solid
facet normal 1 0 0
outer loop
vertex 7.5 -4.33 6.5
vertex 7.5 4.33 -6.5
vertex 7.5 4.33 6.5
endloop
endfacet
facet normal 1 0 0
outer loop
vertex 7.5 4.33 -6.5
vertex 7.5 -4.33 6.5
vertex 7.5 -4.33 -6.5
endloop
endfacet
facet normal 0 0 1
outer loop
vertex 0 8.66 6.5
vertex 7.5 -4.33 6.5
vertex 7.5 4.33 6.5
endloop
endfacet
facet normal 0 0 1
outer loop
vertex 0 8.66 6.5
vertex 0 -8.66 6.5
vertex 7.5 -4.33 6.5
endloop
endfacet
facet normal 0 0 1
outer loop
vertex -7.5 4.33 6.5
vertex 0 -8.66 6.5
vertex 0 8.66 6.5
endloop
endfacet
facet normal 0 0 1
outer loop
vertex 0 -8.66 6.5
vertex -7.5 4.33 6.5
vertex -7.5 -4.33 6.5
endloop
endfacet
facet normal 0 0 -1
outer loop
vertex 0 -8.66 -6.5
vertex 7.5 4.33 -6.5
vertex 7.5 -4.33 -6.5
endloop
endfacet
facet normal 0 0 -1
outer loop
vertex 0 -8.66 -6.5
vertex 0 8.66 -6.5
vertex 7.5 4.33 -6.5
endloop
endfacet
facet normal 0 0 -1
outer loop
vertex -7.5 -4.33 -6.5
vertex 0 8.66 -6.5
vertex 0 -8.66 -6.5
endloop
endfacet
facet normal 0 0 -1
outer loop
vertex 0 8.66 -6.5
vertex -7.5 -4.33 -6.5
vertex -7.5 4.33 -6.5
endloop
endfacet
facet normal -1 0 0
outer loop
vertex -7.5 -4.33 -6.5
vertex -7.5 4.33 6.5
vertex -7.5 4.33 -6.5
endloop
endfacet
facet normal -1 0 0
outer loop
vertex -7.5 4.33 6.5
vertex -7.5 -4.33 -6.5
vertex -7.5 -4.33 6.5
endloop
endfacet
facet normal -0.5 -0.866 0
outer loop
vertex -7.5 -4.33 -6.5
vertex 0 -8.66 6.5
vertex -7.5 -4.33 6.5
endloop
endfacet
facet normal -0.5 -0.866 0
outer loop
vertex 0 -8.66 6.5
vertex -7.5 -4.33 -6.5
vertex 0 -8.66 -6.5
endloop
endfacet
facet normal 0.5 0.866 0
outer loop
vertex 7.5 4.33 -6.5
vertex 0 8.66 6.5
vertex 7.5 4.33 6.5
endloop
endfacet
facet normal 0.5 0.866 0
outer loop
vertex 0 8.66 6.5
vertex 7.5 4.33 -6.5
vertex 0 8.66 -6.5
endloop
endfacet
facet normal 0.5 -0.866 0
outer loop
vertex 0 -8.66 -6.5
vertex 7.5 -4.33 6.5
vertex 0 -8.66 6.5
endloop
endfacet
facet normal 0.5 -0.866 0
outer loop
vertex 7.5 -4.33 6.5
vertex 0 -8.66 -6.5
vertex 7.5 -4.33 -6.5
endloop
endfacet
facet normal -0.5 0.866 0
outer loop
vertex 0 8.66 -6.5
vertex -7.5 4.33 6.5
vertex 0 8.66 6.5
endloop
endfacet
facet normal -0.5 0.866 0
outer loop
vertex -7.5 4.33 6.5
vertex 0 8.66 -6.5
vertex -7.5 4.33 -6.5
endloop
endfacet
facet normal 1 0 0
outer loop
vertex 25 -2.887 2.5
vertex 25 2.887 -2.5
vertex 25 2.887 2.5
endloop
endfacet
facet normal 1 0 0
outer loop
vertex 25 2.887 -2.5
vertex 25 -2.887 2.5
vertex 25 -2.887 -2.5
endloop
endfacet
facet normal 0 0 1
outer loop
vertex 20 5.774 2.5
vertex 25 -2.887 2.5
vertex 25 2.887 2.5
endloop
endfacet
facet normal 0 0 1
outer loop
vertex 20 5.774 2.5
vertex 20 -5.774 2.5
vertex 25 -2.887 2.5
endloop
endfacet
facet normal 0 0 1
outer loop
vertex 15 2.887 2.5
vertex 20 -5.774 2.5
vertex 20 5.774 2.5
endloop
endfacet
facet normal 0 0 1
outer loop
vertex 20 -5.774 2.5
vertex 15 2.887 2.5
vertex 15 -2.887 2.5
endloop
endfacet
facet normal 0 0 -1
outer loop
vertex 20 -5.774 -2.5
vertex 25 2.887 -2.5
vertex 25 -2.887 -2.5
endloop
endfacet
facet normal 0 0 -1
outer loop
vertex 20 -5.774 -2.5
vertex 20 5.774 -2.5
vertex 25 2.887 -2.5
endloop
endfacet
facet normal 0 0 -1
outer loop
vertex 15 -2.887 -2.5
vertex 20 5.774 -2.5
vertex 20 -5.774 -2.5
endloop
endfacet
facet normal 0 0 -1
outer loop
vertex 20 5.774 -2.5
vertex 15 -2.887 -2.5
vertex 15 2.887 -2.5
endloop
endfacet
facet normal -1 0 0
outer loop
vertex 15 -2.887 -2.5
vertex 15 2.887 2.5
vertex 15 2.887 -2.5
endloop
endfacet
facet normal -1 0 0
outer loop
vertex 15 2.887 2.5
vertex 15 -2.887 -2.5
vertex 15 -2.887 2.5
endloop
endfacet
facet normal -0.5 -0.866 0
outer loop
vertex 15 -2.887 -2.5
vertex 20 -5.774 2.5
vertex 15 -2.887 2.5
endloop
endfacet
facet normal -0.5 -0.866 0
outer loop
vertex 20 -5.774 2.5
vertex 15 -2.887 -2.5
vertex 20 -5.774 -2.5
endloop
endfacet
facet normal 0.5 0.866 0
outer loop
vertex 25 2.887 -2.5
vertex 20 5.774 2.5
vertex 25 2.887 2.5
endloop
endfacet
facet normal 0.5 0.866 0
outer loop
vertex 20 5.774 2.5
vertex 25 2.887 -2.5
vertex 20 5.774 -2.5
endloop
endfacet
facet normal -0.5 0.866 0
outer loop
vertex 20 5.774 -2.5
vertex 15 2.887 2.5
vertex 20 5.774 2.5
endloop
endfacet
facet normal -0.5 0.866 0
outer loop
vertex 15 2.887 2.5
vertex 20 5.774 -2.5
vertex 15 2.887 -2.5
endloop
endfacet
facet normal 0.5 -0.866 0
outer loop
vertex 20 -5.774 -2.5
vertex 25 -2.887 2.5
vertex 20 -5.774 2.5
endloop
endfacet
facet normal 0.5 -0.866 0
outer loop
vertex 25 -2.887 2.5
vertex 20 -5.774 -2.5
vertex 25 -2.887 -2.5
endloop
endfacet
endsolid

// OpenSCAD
/**
 *	source code originially from this thing: 
 * 
 * 		http://www.thingiverse.com/thing:277727
 */

//============================================================
// OpenSCAD
// Licence : LICENCE PUBLIQUE RIEN À BRANLER
// Licence : do What The Fuck you want to Public License
//============================================================
/*

	Usage:
	use <Hexagones.scad>;
	Pour créer des jeux, des têtes de vis...

*/


//------------------------------------------------------------
// Demo
//------------------------------------------------------------
$fn = 150 ;			// OpenSCAD Resolution

// hexagone de 1 pouce (1 inch) soit 25.4 mm
Hexagone(cle=15,h=13);

color("green")
translate([20,0,0])
hexagon(cle=10, h=5);

/**
 * this is the English version of the module :)
 */
module hexagon(cle, h)
{
	Hexagone(cle,h);
}

//------------------------------------------------------------
// Hexagone
// cle	écart, ex: clé de 12 alors cle=12
// h		hauteur
//------------------------------------------------------------
module Hexagone(cle,h)
{
	angle = 360/6;		// 6 pans
	cote = cle * cot(angle);
	echo(angle, cot(angle), cote);
	echo(acos(.6));

	union()
	{
		rotate([0,0,0])
			cube([cle,cote,h],center=true);
		rotate([0,0,angle])
			cube([cle,cote,h],center=true);
		rotate([0,0,2*angle])
			cube([cle,cote,h],center=true);
	}

// Vérification par un cercle de taille cle
//	#cylinder(r=cle/2,h=2*h,center=true);
//	%circle(r=cote,center=true);
//	#cube([cote,cote,1]);
}

//------------------------------------------------------------
// Fonction cotangente
// Permet d'avoir les bones dimensions
// utiliser $fn n'est pas bon
//------------------------------------------------------------
function cot(x)=1/tan(x);

//==EOF=======================================================
